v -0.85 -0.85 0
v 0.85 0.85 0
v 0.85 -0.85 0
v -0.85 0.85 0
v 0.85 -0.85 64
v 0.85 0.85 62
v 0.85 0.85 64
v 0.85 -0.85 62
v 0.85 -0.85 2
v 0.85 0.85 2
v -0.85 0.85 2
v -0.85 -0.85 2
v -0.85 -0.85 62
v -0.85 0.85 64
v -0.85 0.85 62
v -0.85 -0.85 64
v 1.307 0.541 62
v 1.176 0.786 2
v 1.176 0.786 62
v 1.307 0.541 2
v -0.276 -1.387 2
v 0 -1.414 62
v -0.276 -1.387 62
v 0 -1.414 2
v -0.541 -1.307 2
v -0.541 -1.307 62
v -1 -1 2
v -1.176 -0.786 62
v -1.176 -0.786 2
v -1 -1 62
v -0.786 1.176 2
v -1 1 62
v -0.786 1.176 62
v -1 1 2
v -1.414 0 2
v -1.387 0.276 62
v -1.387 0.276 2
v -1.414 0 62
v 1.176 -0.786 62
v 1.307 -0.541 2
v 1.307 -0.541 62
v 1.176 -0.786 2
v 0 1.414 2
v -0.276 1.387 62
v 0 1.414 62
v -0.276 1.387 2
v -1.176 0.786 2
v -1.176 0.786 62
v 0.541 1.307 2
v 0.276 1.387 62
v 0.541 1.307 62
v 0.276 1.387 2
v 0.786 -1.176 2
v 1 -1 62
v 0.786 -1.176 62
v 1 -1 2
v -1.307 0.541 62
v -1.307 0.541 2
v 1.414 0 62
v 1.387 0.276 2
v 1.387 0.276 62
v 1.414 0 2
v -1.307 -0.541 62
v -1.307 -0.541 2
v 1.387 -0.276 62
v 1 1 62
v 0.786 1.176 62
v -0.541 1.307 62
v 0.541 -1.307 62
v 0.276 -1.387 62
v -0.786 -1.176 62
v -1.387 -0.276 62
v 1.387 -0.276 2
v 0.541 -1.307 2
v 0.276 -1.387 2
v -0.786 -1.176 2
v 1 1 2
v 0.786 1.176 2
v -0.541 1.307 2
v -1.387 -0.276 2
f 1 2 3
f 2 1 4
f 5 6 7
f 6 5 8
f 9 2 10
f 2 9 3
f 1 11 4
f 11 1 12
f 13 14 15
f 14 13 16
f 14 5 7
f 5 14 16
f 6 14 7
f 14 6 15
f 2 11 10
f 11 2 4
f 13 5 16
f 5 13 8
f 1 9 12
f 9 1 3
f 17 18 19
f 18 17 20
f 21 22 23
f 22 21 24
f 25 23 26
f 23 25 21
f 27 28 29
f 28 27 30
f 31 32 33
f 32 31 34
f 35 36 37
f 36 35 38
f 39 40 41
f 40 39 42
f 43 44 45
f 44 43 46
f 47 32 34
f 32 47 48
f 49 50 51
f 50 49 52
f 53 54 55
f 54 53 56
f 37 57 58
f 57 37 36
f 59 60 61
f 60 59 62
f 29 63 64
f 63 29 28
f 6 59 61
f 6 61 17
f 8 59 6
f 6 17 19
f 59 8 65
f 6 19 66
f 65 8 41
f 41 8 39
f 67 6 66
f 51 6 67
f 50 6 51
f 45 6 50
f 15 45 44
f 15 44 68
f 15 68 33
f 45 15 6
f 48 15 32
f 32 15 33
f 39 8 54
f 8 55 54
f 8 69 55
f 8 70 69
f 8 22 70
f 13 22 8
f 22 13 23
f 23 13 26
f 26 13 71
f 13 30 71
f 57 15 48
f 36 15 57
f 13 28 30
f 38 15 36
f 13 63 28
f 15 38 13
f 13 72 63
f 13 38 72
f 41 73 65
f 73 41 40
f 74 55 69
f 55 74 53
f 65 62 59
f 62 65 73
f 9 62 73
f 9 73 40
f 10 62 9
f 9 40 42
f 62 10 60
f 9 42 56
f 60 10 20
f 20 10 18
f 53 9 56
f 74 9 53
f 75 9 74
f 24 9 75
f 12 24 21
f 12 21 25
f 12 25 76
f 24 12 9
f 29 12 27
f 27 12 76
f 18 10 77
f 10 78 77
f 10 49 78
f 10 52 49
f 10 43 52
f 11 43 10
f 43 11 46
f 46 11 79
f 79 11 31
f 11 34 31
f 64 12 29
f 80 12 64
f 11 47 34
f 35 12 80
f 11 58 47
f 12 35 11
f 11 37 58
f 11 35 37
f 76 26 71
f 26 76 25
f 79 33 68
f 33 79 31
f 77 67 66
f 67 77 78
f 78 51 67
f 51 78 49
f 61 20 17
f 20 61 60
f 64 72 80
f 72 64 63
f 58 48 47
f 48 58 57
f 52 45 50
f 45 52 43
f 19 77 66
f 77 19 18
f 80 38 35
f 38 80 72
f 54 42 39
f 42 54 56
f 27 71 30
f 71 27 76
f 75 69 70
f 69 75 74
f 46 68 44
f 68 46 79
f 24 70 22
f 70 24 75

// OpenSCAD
module rod(h=2, sup=60, th=2, gap=0.3){

	translate([0,0,sup/2+h]){
		rotate(a=90,v=[0,1,0]){
		    cube([sup+2*h,th-gap,th-gap],center=true);
			rotate(a=90,v=[0,1,0]){
				cylinder(h=sup,d=th*sqrt(2), center=true, $fn=32);
			}
		}
	}

}

rod();
